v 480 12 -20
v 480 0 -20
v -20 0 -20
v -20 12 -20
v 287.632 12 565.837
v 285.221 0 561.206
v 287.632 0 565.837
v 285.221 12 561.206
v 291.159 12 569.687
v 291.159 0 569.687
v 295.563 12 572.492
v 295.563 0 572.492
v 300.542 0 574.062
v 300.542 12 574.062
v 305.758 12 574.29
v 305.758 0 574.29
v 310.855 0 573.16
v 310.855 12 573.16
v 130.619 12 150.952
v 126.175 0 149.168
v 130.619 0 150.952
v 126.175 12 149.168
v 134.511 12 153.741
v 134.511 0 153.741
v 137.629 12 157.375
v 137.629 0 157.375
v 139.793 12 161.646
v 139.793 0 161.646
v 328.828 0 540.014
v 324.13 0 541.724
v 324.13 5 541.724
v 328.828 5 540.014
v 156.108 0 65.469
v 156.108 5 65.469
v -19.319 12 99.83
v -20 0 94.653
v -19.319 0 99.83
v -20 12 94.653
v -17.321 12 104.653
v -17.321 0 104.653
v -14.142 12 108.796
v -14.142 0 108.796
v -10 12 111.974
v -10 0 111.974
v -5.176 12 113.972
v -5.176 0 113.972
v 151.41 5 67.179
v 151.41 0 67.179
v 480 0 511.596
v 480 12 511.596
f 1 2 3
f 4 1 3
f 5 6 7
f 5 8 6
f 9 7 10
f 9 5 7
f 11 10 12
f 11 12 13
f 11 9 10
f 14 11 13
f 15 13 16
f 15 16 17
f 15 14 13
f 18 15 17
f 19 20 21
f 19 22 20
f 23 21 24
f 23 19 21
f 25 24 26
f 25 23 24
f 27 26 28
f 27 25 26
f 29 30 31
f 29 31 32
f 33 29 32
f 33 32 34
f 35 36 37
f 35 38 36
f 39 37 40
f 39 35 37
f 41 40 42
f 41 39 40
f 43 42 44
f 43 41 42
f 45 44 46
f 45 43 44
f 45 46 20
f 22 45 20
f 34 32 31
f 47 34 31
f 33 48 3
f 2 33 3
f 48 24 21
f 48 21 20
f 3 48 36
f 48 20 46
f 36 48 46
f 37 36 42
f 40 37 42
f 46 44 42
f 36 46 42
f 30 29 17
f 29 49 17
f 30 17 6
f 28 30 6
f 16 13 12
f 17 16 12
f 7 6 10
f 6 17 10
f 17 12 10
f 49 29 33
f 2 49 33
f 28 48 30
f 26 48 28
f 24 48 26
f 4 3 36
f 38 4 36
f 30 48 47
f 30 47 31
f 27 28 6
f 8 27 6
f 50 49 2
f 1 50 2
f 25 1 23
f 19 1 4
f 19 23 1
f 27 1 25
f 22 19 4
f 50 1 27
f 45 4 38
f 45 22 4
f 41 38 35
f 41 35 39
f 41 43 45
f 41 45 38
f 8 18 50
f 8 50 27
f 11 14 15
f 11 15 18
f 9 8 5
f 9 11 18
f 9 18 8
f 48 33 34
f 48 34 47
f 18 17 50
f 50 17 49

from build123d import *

# Parameters (mm, degrees)
PAD_DEPTH       = 12
POCKET_DEPTH    = 1
FILLET_R        = 20
FILLET001_R     = 20
FILLET002_R     = 20
POCKET001_DEPTH = 5


with BuildPart() as part:
    # Sketch001 → Pad (new body)
    with BuildSketch(Plane.XZ):
        Polygon((-20, -20), (-20, 110), (136.232082, 151.86226), (292.061476, 580), (480, 511.595971), (480, -20), align=None)
    extrude(amount=-PAD_DEPTH)

    # Sketch002 (on Face7 of Pad) → Pocket (cut)
    with BuildSketch(Plane.XZ):
        Polygon((465, -5), (465, 501.092858), (301.026563, 560.774309), (147.656805, 139.394363), (-5, 98.490095), (-5, -5), align=None)
    extrude(amount=POCKET_DEPTH, mode=Mode.SUBTRACT)

    # Fillet
    fillet_edges = [part.edges().sort_by_distance(p)[0] for p in [
        (-20, 6, 110),
    ]]
    fillet(fillet_edges, radius=FILLET_R)

    # Fillet001
    fillet001_edges = [part.edges().sort_by_distance(p)[0] for p in [
        (136.232082, 6, 151.86226),
    ]]
    fillet(fillet001_edges, radius=FILLET001_R)

    # Fillet002
    fillet002_edges = [part.edges().sort_by_distance(p)[0] for p in [
        (292.061476, 6, 580),
    ]]
    fillet(fillet002_edges, radius=FILLET002_R)

    # Sketch003 (on Face7 of Pocket) → Pocket001 (cut)
    with BuildSketch(Plane.XZ):
        Polygon((328.82826, 540.013541), (156.108087, 65.468767), (151.409624, 67.178868), (324.129797, 541.723641), align=None)
    extrude(amount=-POCKET001_DEPTH, mode=Mode.SUBTRACT)


solid = part.part
